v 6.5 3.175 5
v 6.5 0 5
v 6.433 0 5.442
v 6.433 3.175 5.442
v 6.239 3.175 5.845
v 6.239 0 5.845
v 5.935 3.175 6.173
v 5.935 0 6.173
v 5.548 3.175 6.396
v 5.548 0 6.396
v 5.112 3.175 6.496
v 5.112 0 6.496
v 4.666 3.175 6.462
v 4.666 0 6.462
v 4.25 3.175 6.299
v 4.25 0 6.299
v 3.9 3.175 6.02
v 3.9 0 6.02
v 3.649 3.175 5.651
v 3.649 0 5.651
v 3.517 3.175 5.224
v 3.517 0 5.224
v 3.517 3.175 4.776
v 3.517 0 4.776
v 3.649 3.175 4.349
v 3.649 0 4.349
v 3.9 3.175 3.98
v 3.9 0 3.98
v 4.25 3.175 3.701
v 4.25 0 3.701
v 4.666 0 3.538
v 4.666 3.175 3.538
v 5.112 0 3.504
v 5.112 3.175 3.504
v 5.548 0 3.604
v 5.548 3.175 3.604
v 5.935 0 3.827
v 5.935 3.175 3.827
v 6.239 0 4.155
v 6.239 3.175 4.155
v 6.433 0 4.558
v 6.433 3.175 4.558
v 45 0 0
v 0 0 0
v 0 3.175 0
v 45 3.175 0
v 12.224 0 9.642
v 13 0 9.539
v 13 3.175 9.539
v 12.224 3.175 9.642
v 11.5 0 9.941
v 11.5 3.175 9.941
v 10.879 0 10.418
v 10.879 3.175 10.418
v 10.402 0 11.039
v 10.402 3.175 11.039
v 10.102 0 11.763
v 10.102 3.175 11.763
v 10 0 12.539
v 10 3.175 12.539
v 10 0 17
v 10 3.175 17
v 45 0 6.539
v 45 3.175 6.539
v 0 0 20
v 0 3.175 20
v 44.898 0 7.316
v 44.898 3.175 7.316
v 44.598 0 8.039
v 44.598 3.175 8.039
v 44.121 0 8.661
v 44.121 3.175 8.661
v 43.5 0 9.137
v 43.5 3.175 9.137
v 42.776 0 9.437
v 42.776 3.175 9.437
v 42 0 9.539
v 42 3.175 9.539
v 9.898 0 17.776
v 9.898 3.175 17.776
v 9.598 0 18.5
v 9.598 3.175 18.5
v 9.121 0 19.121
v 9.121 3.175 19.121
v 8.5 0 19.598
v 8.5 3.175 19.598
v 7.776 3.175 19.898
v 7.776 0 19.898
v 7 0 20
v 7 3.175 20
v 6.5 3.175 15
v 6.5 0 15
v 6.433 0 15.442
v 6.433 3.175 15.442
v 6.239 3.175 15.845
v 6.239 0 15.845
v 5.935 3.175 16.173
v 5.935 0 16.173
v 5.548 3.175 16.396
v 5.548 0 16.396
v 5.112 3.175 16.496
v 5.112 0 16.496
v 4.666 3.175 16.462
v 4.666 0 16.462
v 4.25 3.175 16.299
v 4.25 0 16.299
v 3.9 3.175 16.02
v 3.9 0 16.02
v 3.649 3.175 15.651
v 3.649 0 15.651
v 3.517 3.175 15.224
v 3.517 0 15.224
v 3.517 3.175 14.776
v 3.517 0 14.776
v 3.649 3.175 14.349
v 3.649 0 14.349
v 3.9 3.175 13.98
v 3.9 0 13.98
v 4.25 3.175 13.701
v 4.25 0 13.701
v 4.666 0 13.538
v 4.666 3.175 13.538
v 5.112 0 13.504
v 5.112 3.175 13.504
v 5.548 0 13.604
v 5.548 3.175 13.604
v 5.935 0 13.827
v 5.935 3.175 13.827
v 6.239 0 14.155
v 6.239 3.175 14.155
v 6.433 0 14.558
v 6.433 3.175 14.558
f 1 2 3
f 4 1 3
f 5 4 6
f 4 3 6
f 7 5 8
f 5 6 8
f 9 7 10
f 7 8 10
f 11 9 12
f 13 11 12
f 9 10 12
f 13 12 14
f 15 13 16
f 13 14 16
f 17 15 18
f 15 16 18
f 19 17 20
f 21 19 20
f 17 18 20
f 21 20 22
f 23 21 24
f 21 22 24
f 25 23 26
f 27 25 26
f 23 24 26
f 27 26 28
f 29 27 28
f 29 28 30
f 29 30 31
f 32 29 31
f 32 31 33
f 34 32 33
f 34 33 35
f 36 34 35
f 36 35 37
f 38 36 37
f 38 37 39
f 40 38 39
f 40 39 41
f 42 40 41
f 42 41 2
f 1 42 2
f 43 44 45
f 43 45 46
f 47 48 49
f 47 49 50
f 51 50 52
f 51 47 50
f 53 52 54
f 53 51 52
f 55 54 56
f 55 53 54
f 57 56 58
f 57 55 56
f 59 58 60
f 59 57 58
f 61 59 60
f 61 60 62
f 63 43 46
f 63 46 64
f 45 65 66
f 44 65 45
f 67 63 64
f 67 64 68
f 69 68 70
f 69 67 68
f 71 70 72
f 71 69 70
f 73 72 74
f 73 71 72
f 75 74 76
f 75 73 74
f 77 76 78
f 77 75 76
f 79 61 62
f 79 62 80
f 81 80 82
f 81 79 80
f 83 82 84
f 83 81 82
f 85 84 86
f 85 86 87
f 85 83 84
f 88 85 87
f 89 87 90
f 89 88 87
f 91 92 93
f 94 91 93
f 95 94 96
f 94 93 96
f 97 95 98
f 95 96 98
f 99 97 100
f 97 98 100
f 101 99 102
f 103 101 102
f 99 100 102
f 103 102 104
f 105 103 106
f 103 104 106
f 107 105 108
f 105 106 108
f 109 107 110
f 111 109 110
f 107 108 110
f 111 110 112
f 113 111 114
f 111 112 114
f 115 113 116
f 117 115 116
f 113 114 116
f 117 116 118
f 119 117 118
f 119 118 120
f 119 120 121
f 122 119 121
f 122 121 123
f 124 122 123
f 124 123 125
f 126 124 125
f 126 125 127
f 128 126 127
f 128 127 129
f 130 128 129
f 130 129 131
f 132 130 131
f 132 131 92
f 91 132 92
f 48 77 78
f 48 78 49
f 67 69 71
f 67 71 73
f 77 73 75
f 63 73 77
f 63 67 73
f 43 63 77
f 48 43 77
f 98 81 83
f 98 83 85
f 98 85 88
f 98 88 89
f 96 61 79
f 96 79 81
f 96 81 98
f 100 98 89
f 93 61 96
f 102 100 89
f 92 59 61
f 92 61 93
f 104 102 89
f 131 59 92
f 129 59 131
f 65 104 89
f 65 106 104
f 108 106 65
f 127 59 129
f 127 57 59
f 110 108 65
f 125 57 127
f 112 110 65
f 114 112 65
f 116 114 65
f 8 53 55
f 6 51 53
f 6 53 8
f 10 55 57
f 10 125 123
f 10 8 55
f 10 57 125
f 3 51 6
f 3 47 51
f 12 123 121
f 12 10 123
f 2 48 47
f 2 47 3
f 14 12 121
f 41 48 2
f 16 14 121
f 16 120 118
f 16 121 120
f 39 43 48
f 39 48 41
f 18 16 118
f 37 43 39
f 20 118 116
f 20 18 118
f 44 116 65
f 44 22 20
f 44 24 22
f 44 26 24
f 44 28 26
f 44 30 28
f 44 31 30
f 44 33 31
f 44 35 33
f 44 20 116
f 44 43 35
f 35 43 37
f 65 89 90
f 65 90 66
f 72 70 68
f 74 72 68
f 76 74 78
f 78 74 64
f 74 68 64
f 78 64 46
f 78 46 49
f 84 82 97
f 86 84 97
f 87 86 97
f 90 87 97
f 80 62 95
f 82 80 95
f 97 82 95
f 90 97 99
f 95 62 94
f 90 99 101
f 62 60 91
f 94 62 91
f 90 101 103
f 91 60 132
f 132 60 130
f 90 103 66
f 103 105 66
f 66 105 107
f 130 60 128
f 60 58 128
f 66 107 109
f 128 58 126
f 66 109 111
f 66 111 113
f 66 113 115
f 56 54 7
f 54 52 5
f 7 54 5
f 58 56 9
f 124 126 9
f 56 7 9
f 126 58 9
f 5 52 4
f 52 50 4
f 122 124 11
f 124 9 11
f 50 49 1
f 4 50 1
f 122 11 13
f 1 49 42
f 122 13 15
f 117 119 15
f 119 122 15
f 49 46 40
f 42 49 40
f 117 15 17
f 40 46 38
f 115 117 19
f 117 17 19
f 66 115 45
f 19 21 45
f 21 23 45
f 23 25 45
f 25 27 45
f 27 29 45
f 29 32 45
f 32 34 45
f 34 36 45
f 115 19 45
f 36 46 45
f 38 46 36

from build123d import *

# Parameters (mm, degrees)
BOSS_EXTRUDE1_DEPTH          = 3.175
F_3_0_3_DIAMETER_HOLE1_D     = 3
F_3_0_3_DIAMETER_HOLE1_DEPTH = 10
F_3_0_3_DIAMETER_HOLE1_TIP   = 0.901290929


with BuildPart() as part:
    # Sketch1 → Boss-Extrude1 (new body)
    with BuildSketch(Plane(origin=(0, 0, 0), x_dir=(1, 0, 0), z_dir=(0, 1, 0))):
        with BuildLine():
            Line((0, 0), (45, 0))
            Line((45, 0), (45, -6.539392014))
            ThreePointArc((45, -6.539392014), (44.121320344, -8.660712358), (42, -9.539392014))
            Line((42, -9.539392014), (13, -9.539392014))
            ThreePointArc((13, -9.539392014), (10.878679656, -10.418071671), (10, -12.539392014))
            Line((10, -12.539392014), (10, -17))
            ThreePointArc((10, -17), (9.121320344, -19.121320344), (7, -20))
            Line((7, -20), (0, -20))
            Line((0, -20), (0, 0))
        make_face()
    extrude(amount=BOSS_EXTRUDE1_DEPTH)

    # Ø3.0 (3) Diameter Hole1
    with Locations(Plane(origin=(0, 3.175, 0), x_dir=(-1, 0, 0), z_dir=(0, 1, 0))):
        with Locations((-5, 5), (-5, 15)):
            Hole(F_3_0_3_DIAMETER_HOLE1_D / 2, depth=F_3_0_3_DIAMETER_HOLE1_DEPTH)
            with Locations((0, 0, -(F_3_0_3_DIAMETER_HOLE1_DEPTH + F_3_0_3_DIAMETER_HOLE1_TIP / 2))):  # 118° drill point
                Cone(0, F_3_0_3_DIAMETER_HOLE1_D / 2, F_3_0_3_DIAMETER_HOLE1_TIP, mode=Mode.SUBTRACT)


solid = part.part
